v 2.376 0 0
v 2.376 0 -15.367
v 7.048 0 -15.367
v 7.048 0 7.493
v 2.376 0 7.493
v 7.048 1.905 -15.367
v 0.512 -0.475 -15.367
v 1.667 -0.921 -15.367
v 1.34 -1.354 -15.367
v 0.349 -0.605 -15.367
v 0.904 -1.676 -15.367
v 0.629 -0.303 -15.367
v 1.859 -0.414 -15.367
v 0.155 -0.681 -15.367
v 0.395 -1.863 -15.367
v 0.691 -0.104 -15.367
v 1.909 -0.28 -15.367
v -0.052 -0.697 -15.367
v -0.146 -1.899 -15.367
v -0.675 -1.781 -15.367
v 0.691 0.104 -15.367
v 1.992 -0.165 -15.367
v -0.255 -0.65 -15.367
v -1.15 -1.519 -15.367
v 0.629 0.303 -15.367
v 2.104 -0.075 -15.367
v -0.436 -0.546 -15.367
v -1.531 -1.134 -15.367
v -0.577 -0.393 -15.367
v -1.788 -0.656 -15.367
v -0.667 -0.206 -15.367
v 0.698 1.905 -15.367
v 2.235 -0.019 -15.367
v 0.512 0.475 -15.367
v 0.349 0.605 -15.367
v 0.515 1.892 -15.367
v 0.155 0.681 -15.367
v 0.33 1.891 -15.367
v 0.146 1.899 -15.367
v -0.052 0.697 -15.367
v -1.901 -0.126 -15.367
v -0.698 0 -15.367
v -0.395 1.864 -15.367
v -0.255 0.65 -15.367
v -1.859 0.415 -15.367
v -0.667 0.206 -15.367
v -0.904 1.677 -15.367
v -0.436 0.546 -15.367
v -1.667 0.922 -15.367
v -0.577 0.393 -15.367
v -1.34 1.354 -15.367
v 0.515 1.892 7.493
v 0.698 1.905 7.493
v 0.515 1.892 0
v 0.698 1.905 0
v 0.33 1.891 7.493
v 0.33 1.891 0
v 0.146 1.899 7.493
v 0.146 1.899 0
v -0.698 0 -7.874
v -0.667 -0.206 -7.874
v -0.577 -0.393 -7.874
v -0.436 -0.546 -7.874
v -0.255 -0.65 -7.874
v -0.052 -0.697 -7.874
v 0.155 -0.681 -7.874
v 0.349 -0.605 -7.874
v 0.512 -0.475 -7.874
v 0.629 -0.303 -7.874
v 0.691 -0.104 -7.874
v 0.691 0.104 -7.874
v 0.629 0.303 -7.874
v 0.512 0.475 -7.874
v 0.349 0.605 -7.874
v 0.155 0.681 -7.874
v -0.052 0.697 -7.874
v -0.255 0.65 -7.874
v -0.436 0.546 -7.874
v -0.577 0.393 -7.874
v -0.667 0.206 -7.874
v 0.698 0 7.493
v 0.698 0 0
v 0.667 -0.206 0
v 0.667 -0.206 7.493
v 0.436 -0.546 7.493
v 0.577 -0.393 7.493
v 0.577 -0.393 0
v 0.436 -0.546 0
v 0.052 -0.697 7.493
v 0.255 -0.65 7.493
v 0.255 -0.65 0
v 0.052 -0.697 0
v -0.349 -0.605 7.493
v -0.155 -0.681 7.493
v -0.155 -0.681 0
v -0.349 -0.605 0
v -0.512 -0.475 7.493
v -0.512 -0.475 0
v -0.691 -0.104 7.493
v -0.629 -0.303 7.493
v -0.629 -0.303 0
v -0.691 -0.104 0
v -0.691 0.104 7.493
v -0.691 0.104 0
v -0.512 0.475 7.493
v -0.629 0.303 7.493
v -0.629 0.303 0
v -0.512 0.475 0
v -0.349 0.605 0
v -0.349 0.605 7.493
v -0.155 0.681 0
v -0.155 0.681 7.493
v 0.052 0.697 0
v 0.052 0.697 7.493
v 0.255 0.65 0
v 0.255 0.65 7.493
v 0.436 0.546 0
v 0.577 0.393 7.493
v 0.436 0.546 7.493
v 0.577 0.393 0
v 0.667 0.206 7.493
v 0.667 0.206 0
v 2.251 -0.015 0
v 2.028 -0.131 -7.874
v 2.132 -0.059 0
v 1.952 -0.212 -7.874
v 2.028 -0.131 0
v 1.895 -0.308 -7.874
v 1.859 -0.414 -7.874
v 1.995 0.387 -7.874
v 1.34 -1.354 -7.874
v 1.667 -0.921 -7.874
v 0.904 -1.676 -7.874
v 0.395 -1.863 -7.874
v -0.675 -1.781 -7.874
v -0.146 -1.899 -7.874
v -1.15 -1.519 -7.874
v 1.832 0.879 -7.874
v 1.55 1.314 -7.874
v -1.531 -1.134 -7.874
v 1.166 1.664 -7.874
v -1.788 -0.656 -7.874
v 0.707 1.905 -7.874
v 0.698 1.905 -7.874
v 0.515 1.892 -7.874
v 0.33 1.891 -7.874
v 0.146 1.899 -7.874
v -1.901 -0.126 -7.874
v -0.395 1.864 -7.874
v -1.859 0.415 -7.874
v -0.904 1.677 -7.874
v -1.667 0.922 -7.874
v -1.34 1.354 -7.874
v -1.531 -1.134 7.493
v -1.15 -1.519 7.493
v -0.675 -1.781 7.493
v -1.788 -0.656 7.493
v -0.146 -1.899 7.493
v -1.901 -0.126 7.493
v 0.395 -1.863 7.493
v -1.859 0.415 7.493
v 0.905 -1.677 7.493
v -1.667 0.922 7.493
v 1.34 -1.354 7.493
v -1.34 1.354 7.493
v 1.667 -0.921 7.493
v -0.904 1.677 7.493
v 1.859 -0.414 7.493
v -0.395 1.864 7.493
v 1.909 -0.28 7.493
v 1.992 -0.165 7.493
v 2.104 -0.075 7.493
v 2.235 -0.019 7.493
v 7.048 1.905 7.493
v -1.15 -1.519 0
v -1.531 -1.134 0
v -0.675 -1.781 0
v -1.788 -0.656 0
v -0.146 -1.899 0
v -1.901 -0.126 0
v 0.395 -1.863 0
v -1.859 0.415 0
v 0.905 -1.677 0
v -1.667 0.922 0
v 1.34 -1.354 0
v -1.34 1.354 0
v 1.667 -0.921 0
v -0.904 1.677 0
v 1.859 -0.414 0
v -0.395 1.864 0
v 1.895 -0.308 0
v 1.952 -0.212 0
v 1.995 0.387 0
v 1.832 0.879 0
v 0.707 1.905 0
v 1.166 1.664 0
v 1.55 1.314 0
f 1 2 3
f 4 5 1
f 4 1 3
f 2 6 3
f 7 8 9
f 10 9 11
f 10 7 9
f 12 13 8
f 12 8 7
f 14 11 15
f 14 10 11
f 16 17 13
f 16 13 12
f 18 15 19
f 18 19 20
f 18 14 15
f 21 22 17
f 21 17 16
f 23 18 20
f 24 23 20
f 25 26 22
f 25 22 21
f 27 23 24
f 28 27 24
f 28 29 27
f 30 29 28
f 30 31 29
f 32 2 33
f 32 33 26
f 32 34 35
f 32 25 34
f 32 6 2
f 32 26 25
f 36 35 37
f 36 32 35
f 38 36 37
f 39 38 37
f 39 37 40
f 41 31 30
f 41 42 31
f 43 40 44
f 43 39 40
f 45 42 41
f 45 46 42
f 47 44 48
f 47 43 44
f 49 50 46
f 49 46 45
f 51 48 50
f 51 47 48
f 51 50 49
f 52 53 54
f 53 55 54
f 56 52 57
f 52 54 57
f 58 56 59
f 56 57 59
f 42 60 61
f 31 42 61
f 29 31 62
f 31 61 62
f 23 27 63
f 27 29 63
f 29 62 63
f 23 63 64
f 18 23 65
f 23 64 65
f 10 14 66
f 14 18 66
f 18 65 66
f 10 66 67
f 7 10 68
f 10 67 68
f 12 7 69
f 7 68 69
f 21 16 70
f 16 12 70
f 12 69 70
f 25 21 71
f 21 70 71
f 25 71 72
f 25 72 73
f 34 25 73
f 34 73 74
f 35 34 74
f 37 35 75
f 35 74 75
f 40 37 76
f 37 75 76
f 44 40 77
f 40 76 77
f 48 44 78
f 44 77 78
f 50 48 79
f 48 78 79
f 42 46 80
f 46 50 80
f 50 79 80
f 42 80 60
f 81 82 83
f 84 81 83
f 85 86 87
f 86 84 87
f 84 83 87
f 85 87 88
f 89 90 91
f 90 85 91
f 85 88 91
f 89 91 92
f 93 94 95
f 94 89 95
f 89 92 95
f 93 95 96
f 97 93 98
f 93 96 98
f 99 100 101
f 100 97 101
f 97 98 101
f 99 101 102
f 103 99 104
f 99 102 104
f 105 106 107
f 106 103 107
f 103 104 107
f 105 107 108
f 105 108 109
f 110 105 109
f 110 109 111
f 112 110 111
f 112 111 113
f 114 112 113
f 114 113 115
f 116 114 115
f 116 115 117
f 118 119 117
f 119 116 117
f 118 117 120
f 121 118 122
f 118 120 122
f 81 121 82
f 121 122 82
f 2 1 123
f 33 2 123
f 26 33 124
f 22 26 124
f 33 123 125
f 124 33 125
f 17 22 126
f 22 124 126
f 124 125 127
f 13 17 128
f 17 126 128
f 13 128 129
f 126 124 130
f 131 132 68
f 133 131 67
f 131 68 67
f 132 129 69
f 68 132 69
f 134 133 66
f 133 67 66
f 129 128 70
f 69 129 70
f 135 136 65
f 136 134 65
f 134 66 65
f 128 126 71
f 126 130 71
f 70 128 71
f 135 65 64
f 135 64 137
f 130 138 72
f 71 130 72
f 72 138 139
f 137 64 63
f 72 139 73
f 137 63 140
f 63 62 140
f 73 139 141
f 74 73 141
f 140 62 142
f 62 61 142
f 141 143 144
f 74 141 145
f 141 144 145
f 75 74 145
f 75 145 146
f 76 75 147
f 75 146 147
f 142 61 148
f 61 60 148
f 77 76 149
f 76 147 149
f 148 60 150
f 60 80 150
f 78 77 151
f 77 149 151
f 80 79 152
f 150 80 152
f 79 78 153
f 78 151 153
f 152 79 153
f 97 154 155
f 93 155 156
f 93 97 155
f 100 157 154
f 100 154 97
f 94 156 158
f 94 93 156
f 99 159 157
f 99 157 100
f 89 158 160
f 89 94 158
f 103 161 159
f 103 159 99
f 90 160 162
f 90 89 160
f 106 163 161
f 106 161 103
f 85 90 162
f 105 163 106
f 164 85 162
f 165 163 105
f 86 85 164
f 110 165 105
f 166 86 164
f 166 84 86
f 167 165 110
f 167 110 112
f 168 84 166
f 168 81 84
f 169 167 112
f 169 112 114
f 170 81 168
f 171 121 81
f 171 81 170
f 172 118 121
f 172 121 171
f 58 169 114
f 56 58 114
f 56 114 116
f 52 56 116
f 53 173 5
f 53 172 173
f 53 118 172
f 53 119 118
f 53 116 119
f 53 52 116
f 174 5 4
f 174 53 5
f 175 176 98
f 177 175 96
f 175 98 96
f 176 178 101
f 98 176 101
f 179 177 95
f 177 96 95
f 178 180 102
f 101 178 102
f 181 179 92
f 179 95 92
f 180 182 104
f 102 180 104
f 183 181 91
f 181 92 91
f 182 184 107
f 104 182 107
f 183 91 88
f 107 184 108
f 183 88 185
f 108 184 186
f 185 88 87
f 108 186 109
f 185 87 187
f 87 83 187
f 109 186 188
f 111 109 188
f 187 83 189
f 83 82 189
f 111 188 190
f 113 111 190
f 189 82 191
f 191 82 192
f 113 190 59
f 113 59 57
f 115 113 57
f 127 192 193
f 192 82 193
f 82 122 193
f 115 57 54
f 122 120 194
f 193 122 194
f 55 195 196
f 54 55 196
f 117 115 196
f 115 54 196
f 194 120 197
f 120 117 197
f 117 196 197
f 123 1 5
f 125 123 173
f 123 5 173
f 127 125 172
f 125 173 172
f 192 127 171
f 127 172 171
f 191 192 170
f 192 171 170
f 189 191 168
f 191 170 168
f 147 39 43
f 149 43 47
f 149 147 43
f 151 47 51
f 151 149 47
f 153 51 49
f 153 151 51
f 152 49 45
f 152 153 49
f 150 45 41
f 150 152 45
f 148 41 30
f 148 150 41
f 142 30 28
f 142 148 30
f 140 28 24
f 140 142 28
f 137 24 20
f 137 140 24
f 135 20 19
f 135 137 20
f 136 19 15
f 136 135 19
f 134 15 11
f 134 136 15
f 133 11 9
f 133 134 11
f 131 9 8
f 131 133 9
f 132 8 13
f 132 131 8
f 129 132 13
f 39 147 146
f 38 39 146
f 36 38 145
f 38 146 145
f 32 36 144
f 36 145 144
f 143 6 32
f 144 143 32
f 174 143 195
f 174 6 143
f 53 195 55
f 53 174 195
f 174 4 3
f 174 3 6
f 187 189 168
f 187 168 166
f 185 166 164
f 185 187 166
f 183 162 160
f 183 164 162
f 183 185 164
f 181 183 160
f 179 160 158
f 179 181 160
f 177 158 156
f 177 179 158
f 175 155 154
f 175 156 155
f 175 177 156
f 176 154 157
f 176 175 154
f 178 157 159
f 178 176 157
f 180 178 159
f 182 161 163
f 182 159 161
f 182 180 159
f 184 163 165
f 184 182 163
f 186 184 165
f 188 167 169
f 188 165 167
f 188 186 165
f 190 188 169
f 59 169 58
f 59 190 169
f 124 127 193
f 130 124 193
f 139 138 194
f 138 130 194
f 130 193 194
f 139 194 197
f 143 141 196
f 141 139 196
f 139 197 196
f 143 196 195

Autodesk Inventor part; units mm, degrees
ref_plane "YZ Plane" through (0, 0, 0) normal (1, 0, 0) x (0, 1, 0)
ref_plane "XZ Plane" through (0, 0, 0) normal (0, 1, 0) x (-1, 0, 0)
ref_plane "XY Plane" through (0, 0, 0) normal (0, 0, 1) x (1, 0, 0)
sketch "Sketch1" plane through (0, 0, 0) normal (0, 0, 1) x (1, 0, 0)
  circle A0 centre (0, 0) radius 0.6985
  circle A1 centre (0, 0) radius 1.905
  line L0 (0.6985, 0) -> (7.0485, 0)
  line L1 (7.0485, 0) -> (7.0485, 1.905)
  line L2 (7.0485, 1.905) -> (0.6985, 1.905)
  line L3 (0.6985, 1.905) -> (0.6985, 0)
  point P0 (0.6985, 1.7723)
  point P1 (1.905, 0)
  dimension "d0" = 1.397
  dimension "d1" = 3.81
  dimension "d4" = 6.35
  dimension "d5" = 1.905
extrude "Extrusion1" add sketch "Sketch1" along normal blind 7.493
fillet "Fillet1" radius 3.175 1 edges at (0.6985, 1.7723, 3.7465)
fillet "Fillet2" radius 0.5292 1 edges at (1.905, 0, 3.7465)
sketch "Sketch2" plane through (0, 0, 0) normal (0, 0, -1) x (-1, 0, 0)
  arc A0 (-0.6985, 1.905) -> (-0.1463, 1.8994) centre (-0.3902, 5.065) ccw projected
  line L0 (-7.0485, 1.905) -> (-0.6985, 1.905) projected
  line L1 (-7.0485, 0) -> (-7.0485, 1.905) projected
  line L2 (-2.376, 0) -> (-7.0485, 0) projected
  arc A1 (-1.8594, -0.4141) -> (-2.376, 0) centre (-2.376, -0.5292) ccw projected
  arc A2 (-1.8594, -0.4141) -> (-0.1463, 1.8994) centre (0, 0) ccw projected
  circle A3 centre (0, 0) radius 0.6985 projected
  circle A4 centre (0, 0) radius 1.905
  circle A5 centre (0, 0) radius 2.032
  line L3 (-0.5019, 1.969) -> (-0.5019, 1.892)
  point P0 (-2.0278, -0.1307)
  point P1 (0.0205, 1.3968)
  point P2 (-0.7071, 1.905)
  dimension "d8" = 0.127
extrude "Extrusion2" add sketch "Sketch2" along normal blind 7.874 contours A5 A1 L2 L1 L0
extrude "Extrusion3" add sketch "Sketch2" along normal blind 7.493 from surface at 7.874 contours A0 A4 A1 A5 L0 | A5 A1 L2 L1 L0 | A2 A4
properties part number "outerhinge"
